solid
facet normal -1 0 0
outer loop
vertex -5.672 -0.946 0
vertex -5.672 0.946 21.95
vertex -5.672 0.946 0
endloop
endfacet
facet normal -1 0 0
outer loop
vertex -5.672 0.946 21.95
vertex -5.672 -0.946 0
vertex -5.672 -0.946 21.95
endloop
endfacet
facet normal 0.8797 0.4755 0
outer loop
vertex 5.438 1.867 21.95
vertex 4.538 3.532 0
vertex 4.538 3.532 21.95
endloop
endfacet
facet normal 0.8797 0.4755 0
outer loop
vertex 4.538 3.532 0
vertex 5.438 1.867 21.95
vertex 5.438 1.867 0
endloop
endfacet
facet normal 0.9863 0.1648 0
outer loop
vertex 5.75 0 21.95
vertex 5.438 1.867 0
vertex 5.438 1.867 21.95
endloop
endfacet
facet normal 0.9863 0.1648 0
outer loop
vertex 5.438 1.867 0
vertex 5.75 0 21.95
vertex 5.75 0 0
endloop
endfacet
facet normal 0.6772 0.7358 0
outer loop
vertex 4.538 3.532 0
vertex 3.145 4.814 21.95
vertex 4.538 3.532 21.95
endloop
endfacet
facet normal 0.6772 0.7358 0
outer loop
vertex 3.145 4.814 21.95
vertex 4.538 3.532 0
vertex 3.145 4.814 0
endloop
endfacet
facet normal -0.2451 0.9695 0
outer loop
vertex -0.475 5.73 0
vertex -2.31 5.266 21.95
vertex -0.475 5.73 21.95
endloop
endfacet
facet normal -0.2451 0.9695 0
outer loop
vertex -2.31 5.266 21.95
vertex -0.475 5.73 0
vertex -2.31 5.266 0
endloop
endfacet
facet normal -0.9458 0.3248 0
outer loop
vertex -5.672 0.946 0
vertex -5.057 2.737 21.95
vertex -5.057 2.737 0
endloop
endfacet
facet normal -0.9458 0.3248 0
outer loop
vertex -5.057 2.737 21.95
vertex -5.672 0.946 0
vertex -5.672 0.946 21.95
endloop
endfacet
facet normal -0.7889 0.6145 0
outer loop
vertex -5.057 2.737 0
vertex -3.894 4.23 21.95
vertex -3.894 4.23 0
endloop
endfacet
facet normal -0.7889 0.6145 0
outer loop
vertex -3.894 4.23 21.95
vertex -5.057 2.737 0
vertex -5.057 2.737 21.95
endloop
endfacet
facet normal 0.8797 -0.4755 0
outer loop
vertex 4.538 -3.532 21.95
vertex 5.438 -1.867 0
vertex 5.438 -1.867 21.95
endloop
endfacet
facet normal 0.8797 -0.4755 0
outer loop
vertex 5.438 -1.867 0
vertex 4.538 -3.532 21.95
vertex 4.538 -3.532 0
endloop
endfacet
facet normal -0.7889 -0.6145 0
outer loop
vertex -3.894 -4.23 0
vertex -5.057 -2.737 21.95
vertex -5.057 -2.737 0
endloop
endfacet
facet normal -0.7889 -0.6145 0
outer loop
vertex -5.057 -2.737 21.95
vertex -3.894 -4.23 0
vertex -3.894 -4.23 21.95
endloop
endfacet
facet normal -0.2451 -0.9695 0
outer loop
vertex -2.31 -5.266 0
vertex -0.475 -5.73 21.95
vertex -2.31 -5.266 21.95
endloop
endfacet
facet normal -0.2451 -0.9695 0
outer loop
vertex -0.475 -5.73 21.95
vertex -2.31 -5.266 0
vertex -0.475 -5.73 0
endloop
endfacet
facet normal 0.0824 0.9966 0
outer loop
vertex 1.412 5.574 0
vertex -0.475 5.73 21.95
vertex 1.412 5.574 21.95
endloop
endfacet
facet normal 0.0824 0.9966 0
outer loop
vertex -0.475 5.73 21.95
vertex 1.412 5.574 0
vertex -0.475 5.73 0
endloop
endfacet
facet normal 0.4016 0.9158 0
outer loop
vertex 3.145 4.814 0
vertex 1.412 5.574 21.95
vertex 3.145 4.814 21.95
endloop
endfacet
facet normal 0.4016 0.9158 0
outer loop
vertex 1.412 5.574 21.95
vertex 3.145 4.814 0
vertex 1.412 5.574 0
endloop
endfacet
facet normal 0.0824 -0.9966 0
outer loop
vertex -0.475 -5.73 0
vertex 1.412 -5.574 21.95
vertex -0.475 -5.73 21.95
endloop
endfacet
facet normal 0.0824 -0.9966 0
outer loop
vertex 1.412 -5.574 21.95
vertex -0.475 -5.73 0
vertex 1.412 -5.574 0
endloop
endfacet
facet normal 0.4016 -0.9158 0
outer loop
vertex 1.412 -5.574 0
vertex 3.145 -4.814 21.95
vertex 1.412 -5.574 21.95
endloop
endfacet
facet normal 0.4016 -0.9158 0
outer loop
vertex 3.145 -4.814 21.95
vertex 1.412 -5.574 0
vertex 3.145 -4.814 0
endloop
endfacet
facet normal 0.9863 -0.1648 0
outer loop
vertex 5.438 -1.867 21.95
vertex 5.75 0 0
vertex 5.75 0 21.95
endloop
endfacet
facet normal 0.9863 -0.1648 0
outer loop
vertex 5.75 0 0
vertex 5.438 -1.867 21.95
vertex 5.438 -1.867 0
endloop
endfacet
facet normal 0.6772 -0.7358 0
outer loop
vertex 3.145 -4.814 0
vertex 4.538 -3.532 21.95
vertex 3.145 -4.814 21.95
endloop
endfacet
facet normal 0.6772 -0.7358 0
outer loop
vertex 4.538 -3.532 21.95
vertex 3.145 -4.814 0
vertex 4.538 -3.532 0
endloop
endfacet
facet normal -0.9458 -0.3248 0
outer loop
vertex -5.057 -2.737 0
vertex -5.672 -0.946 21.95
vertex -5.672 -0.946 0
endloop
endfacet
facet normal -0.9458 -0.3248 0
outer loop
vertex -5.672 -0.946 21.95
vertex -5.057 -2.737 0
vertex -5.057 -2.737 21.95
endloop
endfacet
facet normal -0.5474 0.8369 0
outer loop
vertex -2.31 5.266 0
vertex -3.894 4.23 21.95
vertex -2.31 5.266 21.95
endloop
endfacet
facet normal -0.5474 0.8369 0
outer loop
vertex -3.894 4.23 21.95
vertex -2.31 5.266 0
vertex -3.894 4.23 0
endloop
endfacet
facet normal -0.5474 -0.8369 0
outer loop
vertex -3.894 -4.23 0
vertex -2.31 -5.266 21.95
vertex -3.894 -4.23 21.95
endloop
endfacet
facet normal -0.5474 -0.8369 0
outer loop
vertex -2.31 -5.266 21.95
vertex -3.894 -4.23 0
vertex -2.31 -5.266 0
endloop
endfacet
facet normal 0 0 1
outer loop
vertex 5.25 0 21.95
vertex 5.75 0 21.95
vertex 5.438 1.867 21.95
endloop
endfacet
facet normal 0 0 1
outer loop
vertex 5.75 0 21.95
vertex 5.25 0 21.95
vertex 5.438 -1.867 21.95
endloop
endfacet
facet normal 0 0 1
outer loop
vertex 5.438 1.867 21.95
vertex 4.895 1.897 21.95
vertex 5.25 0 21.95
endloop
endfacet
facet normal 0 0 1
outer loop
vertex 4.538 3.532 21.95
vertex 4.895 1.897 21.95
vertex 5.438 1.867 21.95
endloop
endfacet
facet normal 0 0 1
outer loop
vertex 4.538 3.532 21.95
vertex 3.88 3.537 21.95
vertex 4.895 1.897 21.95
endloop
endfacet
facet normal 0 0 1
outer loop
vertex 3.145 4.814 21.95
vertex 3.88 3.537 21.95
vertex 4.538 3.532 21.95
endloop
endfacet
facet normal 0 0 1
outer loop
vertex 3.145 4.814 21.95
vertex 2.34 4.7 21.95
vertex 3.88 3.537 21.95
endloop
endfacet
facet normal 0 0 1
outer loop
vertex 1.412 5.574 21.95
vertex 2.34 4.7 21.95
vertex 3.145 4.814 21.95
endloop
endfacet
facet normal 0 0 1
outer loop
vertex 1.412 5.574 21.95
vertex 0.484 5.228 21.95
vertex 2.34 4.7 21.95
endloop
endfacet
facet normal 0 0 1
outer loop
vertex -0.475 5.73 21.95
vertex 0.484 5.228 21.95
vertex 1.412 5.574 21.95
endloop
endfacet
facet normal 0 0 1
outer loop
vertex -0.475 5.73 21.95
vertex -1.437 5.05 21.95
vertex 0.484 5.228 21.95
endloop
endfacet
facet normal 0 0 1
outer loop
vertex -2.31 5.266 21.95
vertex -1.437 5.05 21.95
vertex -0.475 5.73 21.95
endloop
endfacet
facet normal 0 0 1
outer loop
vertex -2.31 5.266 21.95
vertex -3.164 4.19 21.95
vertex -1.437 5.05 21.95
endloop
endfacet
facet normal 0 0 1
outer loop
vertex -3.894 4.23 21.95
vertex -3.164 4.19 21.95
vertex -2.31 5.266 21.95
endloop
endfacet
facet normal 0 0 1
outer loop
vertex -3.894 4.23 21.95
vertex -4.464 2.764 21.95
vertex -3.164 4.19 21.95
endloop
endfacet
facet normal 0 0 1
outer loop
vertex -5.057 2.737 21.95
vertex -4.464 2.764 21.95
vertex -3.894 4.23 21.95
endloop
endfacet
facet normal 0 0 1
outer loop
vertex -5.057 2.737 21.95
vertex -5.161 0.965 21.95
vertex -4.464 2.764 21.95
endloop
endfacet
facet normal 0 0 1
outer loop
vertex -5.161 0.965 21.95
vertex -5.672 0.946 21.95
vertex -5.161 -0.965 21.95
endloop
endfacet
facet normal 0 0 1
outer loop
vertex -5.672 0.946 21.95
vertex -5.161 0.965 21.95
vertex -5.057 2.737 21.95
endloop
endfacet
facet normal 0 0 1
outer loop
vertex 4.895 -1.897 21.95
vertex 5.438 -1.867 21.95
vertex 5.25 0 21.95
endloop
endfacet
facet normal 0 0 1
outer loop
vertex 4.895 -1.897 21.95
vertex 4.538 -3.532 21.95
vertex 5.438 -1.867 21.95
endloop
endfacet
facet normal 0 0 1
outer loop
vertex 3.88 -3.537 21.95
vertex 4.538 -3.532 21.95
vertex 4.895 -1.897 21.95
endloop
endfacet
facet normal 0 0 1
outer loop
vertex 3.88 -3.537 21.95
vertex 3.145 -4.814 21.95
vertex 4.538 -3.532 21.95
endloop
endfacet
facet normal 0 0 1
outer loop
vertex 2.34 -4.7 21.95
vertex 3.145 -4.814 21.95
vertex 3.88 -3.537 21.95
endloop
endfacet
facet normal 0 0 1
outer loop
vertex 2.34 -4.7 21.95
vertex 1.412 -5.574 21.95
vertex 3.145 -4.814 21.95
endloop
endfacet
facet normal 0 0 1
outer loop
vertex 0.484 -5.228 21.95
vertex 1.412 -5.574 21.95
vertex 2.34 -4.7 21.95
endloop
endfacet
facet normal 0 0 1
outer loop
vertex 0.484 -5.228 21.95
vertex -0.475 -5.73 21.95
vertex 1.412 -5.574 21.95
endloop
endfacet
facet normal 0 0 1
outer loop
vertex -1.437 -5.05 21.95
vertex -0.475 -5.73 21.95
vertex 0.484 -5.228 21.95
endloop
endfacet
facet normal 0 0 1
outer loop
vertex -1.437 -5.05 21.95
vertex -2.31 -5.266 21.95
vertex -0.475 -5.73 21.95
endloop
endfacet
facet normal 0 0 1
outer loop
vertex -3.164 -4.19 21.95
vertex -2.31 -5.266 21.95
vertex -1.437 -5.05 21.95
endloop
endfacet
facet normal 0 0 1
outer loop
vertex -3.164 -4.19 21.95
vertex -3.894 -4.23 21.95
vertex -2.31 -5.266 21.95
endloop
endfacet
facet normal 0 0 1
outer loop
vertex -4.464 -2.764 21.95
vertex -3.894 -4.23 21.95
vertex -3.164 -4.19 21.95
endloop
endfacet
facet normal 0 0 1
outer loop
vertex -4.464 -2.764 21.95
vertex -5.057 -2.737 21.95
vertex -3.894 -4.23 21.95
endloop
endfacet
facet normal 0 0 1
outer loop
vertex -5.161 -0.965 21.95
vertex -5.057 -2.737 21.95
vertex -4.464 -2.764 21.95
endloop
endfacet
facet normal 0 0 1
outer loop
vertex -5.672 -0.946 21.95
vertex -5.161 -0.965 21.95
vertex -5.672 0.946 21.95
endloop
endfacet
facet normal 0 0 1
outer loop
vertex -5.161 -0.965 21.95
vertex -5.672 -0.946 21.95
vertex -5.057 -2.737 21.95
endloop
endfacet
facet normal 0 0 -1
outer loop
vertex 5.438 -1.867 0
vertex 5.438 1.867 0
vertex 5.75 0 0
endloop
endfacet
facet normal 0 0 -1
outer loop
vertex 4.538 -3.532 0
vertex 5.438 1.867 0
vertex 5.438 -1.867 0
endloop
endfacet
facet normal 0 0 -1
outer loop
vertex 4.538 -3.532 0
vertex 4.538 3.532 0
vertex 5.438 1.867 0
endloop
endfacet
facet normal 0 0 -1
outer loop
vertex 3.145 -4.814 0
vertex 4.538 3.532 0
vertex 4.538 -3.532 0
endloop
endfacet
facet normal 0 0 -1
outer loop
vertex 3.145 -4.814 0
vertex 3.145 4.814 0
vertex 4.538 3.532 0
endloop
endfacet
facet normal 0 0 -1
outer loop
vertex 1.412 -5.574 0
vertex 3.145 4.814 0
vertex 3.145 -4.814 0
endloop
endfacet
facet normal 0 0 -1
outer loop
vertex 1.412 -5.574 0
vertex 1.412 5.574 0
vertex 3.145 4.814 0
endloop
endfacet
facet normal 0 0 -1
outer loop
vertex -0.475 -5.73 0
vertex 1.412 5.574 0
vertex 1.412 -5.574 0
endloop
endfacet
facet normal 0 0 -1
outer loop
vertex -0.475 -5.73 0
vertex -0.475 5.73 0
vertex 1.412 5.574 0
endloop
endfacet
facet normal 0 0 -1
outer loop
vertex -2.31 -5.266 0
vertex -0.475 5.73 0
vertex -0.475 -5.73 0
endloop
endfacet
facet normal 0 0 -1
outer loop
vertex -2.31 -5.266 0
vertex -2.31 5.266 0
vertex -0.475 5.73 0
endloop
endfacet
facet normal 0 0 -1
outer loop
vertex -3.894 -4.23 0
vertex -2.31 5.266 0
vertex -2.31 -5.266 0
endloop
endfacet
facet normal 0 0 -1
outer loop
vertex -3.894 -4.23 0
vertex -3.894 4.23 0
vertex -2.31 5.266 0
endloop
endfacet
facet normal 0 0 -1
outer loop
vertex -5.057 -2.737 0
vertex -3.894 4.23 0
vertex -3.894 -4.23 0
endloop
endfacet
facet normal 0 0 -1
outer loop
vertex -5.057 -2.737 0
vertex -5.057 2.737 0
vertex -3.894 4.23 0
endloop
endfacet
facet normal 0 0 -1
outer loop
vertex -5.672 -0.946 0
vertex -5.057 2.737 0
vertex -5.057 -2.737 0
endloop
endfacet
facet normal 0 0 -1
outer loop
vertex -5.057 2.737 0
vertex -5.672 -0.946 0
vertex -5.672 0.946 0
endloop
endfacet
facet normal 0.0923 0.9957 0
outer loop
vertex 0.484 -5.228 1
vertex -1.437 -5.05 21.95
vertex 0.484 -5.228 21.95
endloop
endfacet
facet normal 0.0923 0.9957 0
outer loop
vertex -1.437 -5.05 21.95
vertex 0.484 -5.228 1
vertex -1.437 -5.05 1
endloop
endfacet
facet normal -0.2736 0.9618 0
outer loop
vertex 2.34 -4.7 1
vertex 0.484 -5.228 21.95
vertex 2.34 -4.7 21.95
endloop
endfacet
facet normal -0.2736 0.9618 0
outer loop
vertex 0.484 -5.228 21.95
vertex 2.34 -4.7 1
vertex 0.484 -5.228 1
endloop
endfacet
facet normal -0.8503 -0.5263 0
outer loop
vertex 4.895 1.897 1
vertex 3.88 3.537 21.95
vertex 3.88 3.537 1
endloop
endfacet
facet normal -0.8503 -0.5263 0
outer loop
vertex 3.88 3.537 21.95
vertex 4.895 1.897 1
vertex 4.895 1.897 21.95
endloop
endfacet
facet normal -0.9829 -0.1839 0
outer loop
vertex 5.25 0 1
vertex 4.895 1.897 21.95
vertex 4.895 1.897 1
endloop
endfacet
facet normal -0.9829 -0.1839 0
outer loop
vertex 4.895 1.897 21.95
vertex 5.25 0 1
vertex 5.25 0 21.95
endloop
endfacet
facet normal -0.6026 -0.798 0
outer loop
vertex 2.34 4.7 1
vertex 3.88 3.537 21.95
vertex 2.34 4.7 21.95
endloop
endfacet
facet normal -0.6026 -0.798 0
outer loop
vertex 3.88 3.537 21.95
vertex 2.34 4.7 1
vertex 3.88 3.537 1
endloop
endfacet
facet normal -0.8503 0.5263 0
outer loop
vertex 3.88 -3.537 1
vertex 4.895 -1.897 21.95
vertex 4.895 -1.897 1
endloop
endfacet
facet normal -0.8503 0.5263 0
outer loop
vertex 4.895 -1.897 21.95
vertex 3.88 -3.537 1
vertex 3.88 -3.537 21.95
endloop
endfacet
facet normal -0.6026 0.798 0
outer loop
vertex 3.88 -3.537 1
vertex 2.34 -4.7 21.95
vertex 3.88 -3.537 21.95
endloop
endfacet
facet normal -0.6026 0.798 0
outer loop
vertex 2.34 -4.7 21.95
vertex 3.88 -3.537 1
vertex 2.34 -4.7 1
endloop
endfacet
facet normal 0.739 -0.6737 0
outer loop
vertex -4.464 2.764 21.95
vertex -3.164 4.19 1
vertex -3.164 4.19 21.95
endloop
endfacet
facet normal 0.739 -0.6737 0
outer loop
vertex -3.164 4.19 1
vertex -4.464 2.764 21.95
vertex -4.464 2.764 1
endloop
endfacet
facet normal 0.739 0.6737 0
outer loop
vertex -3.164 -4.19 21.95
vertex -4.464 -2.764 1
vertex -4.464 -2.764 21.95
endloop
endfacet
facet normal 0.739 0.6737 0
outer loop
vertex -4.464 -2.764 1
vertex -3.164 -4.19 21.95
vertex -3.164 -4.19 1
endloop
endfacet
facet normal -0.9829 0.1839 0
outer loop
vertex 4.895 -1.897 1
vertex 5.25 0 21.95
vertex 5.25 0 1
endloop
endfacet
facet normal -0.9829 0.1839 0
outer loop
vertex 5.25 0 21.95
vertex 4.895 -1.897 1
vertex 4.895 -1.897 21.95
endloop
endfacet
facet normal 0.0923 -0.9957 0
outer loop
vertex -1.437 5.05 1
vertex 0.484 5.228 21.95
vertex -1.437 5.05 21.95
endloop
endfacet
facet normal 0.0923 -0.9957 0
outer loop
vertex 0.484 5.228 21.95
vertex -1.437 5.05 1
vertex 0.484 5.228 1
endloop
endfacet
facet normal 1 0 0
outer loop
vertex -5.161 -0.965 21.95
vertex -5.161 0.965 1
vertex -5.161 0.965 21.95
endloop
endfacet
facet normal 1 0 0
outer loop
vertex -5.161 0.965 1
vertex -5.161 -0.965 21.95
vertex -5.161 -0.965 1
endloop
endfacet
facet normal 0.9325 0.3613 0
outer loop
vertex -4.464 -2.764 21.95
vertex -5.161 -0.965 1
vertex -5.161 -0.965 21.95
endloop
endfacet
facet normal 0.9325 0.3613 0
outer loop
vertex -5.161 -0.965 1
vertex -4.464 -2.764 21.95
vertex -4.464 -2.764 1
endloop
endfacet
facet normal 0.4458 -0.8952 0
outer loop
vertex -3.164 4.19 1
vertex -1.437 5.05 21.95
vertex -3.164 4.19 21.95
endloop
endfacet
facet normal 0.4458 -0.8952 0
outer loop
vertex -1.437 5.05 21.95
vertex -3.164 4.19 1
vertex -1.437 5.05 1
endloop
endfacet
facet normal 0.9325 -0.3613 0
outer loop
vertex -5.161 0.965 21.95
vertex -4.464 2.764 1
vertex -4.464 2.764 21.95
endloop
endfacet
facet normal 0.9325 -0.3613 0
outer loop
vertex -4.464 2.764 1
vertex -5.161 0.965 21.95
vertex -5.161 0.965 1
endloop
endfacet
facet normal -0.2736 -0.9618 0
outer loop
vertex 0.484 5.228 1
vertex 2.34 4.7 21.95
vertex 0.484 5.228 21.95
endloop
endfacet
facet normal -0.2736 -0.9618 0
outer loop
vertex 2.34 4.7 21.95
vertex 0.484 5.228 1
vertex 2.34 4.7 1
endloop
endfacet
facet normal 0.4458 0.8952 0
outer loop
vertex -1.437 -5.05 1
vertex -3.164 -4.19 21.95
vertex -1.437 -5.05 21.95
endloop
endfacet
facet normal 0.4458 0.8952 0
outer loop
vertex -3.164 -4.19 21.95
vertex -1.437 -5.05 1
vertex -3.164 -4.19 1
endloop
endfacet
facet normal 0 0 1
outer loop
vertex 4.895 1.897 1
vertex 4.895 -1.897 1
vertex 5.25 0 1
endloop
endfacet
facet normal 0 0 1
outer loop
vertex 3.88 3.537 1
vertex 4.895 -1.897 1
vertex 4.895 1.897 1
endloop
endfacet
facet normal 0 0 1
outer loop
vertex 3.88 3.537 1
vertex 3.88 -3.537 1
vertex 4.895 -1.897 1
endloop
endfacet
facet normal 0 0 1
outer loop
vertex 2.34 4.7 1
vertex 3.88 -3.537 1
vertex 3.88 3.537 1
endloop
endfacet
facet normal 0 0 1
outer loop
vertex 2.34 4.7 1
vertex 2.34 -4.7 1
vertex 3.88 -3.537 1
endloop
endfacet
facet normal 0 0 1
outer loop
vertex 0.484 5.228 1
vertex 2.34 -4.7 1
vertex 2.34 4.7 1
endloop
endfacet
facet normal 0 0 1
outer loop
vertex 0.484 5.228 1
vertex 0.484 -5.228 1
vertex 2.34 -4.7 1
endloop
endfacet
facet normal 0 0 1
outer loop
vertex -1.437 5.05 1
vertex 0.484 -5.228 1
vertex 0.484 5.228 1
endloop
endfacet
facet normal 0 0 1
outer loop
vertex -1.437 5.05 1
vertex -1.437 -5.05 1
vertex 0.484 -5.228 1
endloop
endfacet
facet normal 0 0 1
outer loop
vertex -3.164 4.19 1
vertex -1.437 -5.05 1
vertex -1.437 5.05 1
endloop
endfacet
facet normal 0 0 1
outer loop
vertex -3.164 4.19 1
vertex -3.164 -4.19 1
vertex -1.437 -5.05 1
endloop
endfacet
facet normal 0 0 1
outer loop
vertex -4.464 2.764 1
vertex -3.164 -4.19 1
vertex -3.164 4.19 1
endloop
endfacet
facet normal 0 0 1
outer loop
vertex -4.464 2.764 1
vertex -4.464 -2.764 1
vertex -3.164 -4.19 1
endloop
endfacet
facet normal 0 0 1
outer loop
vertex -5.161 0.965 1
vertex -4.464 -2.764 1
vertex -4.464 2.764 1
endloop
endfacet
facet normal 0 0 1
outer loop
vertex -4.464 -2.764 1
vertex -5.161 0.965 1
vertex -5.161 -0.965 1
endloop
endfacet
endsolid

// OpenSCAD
coin_diameter = 10;
coin_depth = 1;
number_of_coins = 20;

coin_diameter_space = 0.5;
coin_depth_space = 0.05;

wall_width = 1;
floor_depth = 1;

tube_inner_height = coin_depth * number_of_coins + coin_depth_space * (number_of_coins - 1);
tube_inner_diameter = coin_diameter + coin_diameter_space;

tube_outer_height = tube_inner_height + floor_depth;
tube_outer_diameter = tube_inner_diameter + wall_width;

difference()
{
	cylinder(h=tube_outer_height, d=tube_outer_diameter);

	translate([0, 0, floor_depth])
	cylinder(h=tube_inner_height + 1, d=tube_inner_diameter);
}
